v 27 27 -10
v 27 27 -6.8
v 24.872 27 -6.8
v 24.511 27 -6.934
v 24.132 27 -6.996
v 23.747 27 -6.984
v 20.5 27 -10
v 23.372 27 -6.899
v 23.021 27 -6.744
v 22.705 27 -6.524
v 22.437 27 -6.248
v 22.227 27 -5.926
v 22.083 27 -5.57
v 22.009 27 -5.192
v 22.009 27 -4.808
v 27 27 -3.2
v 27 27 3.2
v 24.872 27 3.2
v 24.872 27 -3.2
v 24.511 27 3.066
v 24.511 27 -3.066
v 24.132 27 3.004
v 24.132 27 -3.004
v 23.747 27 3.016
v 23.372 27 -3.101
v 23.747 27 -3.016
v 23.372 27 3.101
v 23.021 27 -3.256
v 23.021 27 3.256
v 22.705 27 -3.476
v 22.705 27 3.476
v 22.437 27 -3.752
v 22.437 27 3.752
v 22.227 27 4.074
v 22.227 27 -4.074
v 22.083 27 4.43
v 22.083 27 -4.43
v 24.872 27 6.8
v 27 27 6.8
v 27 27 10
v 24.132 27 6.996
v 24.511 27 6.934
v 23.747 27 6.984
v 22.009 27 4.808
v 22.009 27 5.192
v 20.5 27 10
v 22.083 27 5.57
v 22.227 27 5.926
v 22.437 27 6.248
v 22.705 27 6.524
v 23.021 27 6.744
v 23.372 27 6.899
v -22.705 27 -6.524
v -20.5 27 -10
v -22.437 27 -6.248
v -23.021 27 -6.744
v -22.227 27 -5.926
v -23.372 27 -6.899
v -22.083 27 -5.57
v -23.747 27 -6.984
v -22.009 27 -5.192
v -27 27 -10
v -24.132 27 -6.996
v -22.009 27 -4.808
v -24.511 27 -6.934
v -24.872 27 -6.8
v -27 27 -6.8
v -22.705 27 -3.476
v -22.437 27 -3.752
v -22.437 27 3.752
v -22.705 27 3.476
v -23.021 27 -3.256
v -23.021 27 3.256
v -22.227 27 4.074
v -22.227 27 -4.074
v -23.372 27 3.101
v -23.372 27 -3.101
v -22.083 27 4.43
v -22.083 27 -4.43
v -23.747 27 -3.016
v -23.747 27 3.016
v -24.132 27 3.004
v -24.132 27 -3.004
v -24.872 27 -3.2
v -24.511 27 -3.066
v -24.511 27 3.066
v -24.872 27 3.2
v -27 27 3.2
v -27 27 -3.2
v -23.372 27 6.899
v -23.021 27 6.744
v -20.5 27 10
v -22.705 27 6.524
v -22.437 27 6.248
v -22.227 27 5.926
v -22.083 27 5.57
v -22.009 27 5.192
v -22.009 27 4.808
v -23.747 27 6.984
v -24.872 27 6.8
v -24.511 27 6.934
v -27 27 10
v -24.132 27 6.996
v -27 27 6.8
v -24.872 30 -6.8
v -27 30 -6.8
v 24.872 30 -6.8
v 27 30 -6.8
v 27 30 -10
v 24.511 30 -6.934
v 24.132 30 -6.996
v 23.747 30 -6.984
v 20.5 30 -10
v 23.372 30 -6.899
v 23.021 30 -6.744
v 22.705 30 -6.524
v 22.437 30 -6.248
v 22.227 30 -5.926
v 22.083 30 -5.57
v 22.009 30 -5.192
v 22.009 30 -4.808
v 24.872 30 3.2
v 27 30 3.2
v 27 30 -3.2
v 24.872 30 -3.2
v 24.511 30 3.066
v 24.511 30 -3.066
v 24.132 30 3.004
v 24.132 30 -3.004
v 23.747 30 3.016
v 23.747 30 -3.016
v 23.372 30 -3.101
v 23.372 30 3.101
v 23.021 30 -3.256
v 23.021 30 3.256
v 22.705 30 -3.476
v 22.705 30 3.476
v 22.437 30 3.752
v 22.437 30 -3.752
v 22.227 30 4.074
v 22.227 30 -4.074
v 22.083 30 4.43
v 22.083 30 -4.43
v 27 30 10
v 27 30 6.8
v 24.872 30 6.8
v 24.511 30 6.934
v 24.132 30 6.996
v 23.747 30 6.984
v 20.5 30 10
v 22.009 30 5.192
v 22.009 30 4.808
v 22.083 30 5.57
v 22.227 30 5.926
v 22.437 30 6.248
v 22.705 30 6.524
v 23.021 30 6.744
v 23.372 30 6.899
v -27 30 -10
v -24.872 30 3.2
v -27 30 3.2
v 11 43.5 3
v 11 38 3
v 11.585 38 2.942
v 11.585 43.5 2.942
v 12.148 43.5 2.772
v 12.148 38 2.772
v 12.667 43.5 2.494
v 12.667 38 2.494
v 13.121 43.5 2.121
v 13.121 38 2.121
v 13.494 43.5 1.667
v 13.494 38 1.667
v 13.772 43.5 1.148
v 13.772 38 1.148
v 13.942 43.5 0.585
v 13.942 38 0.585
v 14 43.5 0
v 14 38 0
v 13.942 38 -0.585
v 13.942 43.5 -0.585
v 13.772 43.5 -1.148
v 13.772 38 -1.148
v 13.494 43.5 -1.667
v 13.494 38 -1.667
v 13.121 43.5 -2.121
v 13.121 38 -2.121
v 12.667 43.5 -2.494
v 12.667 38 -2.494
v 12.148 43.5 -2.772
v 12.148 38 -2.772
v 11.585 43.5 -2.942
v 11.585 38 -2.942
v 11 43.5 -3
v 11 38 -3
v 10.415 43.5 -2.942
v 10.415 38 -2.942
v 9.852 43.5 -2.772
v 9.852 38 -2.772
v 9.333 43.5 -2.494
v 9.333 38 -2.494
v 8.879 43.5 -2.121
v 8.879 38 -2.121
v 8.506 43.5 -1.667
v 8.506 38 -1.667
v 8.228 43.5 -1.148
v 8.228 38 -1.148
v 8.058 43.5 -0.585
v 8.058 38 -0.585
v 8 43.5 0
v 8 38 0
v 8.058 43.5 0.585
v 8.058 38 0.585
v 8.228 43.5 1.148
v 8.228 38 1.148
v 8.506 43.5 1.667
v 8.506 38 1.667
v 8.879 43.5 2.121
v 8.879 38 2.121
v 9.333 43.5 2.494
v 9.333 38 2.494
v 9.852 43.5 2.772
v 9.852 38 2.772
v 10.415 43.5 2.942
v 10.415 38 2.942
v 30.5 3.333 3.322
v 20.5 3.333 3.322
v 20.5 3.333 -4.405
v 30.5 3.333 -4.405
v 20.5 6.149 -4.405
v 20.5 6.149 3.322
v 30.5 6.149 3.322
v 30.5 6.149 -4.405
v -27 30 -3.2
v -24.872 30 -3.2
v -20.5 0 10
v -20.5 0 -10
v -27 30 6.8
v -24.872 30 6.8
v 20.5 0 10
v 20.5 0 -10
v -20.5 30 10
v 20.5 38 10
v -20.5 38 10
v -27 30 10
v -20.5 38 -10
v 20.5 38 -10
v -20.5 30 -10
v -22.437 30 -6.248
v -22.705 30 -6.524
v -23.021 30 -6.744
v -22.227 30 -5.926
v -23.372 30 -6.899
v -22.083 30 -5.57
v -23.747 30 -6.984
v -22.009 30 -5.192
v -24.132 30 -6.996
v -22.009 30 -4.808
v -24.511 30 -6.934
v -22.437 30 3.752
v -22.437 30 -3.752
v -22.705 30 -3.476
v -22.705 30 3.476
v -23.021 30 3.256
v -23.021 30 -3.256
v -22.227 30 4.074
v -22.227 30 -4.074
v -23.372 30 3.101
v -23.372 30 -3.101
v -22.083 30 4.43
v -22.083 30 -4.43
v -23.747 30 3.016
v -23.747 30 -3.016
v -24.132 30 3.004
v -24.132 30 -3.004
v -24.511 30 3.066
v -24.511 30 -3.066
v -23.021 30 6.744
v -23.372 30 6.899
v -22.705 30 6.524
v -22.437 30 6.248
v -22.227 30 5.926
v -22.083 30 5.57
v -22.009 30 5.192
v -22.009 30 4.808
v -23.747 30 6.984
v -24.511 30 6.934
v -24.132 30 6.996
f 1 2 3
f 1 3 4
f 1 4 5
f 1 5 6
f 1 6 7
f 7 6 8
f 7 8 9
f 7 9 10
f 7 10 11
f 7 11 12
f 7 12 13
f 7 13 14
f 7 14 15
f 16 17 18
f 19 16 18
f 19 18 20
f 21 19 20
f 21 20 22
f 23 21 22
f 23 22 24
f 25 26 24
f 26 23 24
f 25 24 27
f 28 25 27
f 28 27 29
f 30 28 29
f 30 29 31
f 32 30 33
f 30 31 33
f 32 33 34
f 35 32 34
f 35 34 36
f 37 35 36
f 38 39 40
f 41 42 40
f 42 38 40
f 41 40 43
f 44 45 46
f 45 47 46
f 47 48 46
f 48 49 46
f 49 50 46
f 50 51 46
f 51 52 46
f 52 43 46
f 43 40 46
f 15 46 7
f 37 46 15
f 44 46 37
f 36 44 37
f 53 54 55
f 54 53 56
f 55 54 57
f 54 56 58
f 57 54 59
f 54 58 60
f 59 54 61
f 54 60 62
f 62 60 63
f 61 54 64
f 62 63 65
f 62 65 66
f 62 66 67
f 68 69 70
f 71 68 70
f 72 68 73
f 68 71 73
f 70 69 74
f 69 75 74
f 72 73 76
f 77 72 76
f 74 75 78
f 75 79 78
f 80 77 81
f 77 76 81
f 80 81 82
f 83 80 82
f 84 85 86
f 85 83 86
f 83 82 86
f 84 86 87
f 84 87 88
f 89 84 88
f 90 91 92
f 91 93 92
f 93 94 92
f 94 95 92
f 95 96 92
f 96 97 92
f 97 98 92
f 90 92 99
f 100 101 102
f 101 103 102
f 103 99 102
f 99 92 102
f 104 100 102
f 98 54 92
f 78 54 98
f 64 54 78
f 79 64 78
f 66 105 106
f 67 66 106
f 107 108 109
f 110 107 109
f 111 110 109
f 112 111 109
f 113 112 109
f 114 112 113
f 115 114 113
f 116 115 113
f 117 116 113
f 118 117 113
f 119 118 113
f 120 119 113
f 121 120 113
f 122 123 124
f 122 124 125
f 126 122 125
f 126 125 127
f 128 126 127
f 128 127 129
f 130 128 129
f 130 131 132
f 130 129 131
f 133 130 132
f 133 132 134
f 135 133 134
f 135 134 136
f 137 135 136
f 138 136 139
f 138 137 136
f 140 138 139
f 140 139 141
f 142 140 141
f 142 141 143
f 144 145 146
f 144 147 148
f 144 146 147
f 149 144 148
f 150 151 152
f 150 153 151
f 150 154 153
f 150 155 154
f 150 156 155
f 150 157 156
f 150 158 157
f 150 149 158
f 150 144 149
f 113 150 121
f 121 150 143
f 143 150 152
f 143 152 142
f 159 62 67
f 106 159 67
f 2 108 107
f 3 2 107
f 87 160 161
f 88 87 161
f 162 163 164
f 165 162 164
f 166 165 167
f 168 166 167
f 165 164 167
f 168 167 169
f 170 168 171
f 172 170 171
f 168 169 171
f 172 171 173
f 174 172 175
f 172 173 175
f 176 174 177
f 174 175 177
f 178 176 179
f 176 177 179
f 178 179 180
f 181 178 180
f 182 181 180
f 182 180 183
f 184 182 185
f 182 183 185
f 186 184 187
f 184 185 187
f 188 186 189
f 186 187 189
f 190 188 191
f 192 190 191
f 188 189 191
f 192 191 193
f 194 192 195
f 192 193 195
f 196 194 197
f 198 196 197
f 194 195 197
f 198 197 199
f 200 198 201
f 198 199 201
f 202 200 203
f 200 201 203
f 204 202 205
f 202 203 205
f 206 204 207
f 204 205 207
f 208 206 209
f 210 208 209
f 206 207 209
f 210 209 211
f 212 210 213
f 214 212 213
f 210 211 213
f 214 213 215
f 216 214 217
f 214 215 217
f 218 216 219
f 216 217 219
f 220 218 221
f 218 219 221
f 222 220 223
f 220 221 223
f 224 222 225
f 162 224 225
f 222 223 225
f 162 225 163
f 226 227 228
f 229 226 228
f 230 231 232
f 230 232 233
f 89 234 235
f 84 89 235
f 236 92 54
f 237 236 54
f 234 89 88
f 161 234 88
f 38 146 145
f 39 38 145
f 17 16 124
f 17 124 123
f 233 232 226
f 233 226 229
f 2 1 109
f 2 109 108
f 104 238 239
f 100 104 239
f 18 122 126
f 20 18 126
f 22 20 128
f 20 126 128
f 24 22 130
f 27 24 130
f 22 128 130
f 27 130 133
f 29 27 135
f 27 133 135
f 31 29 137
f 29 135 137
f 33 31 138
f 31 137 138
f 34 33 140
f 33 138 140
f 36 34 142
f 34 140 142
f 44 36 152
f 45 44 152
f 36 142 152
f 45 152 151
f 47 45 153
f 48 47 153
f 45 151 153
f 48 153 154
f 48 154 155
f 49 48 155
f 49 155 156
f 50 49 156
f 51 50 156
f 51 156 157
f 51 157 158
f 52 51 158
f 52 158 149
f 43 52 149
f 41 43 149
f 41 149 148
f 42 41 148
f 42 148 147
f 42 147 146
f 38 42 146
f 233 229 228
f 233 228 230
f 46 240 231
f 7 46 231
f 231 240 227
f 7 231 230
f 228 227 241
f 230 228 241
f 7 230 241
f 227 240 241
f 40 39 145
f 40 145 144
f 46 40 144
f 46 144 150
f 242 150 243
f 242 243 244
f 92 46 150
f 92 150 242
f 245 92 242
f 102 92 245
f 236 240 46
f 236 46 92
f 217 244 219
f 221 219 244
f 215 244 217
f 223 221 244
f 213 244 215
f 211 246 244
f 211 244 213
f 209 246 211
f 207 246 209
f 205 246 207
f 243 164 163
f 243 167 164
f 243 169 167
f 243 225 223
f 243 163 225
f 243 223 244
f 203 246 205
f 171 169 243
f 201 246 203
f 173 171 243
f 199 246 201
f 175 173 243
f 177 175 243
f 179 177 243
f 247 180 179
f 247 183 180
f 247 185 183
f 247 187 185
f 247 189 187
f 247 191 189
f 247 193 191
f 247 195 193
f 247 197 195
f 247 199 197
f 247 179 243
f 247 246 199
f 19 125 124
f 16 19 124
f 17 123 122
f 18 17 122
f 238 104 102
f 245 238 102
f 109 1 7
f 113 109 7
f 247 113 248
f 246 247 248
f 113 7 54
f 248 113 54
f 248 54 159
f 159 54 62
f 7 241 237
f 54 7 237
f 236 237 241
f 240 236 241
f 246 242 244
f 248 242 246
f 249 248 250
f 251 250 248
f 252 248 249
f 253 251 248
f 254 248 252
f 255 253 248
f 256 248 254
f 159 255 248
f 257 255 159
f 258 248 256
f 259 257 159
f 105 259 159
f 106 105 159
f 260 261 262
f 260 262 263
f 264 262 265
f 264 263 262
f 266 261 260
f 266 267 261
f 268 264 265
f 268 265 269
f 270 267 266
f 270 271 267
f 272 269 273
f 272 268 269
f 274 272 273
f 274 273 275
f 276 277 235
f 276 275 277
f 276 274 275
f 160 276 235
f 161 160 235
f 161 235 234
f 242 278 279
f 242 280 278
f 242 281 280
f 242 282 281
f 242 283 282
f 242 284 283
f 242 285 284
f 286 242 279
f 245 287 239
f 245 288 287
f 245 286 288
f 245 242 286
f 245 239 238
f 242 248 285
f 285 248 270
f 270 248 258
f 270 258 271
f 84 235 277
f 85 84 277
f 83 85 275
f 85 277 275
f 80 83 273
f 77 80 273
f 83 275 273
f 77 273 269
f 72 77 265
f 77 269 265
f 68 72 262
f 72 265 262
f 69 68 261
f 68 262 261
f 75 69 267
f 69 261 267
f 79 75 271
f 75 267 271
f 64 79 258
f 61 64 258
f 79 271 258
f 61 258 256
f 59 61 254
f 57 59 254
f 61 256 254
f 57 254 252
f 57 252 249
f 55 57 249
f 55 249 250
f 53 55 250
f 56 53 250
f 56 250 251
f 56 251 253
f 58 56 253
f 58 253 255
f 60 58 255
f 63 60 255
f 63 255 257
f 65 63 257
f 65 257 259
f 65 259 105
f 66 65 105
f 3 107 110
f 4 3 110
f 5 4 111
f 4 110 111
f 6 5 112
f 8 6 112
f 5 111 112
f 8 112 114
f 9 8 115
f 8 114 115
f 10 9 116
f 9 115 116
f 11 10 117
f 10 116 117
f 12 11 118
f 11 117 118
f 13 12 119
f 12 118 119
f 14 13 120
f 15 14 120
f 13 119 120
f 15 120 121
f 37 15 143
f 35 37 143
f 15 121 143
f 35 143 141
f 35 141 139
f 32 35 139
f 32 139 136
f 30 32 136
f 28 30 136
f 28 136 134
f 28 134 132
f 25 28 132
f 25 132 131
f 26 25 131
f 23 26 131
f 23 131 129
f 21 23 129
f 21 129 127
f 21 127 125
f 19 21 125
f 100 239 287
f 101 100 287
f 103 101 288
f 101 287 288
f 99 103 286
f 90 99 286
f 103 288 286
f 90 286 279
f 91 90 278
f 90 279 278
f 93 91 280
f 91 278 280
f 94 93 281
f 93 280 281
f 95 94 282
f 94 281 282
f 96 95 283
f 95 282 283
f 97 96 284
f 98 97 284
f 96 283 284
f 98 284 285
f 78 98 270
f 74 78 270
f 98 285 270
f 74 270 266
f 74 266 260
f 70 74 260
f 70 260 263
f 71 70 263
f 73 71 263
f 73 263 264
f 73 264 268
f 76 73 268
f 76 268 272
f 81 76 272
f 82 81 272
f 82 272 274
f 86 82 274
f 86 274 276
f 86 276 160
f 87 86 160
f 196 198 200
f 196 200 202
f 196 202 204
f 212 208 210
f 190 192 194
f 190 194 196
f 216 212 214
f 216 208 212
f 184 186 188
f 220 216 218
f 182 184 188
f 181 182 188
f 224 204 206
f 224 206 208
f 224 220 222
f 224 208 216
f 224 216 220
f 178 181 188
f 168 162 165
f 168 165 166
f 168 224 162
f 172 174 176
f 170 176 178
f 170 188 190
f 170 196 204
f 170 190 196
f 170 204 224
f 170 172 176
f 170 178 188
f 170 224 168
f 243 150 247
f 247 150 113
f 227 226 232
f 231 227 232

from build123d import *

# Parameters (mm, degrees)
SKETCH_1_W          = 41
SKETCH_1_H          = 20
EXTRUDE_1_DEPTH     = 38
SKETCH_2_W          = 54
SKETCH_2_H          = 20
EXTRUDE_2_DEPTH     = 3
CUT_EXTRUDE_1_REACH = 43.581
SKETCH_4_R          = 7.5
EXTRUDE_3_DEPTH     = 3
SKETCH_5_R          = 3
EXTRUDE_4_DEPTH     = 5.5
SKETCH_6_W          = 7.726872992
SKETCH_6_H          = 2.816336885
EXTRUDE_5_DEPTH     = 10


with BuildPart() as part:
    # 草圖1 → 伸長1 (new body)
    with BuildSketch(Plane(origin=(0, 0, 0), x_dir=(1, 0, 0), z_dir=(0, 1, 0))):
        Rectangle(SKETCH_1_W, SKETCH_1_H)
    extrude(amount=EXTRUDE_1_DEPTH)

    # 草圖2 → 伸長2 (add)
    with BuildSketch(Plane(origin=(0, 27, 0), x_dir=(-1, 0, 0), z_dir=(0, 1, 0))):
        Rectangle(SKETCH_2_W, SKETCH_2_H)
    extrude(amount=EXTRUDE_2_DEPTH)

    # 草圖3 → 除料-伸長1 (cut, up to next)
    with BuildSketch(Plane(origin=(0, 30, 0), x_dir=(-1, 0, 0), z_dir=(0, 1, 0)), mode=Mode.PRIVATE) as cut_extrude_1_sk1:
        with BuildLine():
            Line((-27, 3.2), (-24.871779789, 3.2))
            ThreePointArc((-24.871779789, 3.2), (-22, 5), (-24.871779789, 6.8))
            Line((-24.871779789, 6.8), (-27, 6.8))
            Line((-27, 6.8), (-27, 3.2))
        make_face()
    cut_extrude_1_tool1 = extrude(cut_extrude_1_sk1.sketch, amount=-CUT_EXTRUDE_1_REACH, mode=Mode.PRIVATE) & part.part
    # 草圖3 → 除料-伸長1 (cut, up to next)
    with BuildSketch(Plane(origin=(0, 30, 0), x_dir=(-1, 0, 0), z_dir=(0, 1, 0)), mode=Mode.PRIVATE) as cut_extrude_1_sk2:
        with BuildLine():
            Line((-27, -6.8), (-24.871779789, -6.8))
            ThreePointArc((-24.871779789, -6.8), (-22, -5), (-24.871779789, -3.2))
            Line((-24.871779789, -3.2), (-27, -3.2))
            Line((-27, -3.2), (-27, -6.8))
        make_face()
    cut_extrude_1_tool2 = extrude(cut_extrude_1_sk2.sketch, amount=-CUT_EXTRUDE_1_REACH, mode=Mode.PRIVATE) & part.part
    # 草圖3 → 除料-伸長1 (cut, up to next)
    with BuildSketch(Plane(origin=(0, 30, 0), x_dir=(-1, 0, 0), z_dir=(0, 1, 0)), mode=Mode.PRIVATE) as cut_extrude_1_sk3:
        with BuildLine():
            Line((27, -3.2), (24.871779789, -3.2))
            ThreePointArc((24.871779789, -3.2), (22, -5), (24.871779789, -6.8))
            Line((24.871779789, -6.8), (27, -6.8))
            Line((27, -6.8), (27, -3.2))
        make_face()
    cut_extrude_1_tool3 = extrude(cut_extrude_1_sk3.sketch, amount=-CUT_EXTRUDE_1_REACH, mode=Mode.PRIVATE) & part.part
    # 草圖3 → 除料-伸長1 (cut, up to next)
    with BuildSketch(Plane(origin=(0, 30, 0), x_dir=(-1, 0, 0), z_dir=(0, 1, 0)), mode=Mode.PRIVATE) as cut_extrude_1_sk4:
        with BuildLine():
            Line((27, 6.8), (24.871779789, 6.8))
            ThreePointArc((24.871779789, 6.8), (22, 5), (24.871779789, 3.2))
            Line((24.871779789, 3.2), (27, 3.2))
            Line((27, 3.2), (27, 6.8))
        make_face()
    cut_extrude_1_tool4 = extrude(cut_extrude_1_sk4.sketch, amount=-CUT_EXTRUDE_1_REACH, mode=Mode.PRIVATE) & part.part
    add(cut_extrude_1_tool1.solids().sort_by_distance((24.63194, 30, 5))[0], mode=Mode.SUBTRACT)
    add(cut_extrude_1_tool2.solids().sort_by_distance((24.63194, 30, -5))[0], mode=Mode.SUBTRACT)
    add(cut_extrude_1_tool3.solids().sort_by_distance((-24.63194, 30, -5))[0], mode=Mode.SUBTRACT)
    add(cut_extrude_1_tool4.solids().sort_by_distance((-24.63194, 30, 5))[0], mode=Mode.SUBTRACT)

    # 草圖4 → 伸長3 (add)
    with BuildSketch(Plane(origin=(0, 30, 0), x_dir=(-1, 0, 0), z_dir=(0, 1, 0))):
        with Locations((-11, 0)):
            Circle(SKETCH_4_R)
    extrude(amount=EXTRUDE_3_DEPTH)

    # 草圖5 → 伸長4 (add)
    with BuildSketch(Plane(origin=(0, 38, 0), x_dir=(-1, 0, 0), z_dir=(0, 1, 0))):
        with Locations(Location((-11, 0, 0), (0, 0, 90))):
            Circle(SKETCH_5_R)
    extrude(amount=EXTRUDE_4_DEPTH)

    # 草圖6 → 伸長5 (add)
    with BuildSketch(Plane(origin=(20.5, 0, 0), x_dir=(0, 0, -1), z_dir=(1, 0, 0))):
        with Locations((0.541603247, 4.740833757)):
            Rectangle(SKETCH_6_W, SKETCH_6_H)
    extrude(amount=EXTRUDE_5_DEPTH)


solid = part.part
